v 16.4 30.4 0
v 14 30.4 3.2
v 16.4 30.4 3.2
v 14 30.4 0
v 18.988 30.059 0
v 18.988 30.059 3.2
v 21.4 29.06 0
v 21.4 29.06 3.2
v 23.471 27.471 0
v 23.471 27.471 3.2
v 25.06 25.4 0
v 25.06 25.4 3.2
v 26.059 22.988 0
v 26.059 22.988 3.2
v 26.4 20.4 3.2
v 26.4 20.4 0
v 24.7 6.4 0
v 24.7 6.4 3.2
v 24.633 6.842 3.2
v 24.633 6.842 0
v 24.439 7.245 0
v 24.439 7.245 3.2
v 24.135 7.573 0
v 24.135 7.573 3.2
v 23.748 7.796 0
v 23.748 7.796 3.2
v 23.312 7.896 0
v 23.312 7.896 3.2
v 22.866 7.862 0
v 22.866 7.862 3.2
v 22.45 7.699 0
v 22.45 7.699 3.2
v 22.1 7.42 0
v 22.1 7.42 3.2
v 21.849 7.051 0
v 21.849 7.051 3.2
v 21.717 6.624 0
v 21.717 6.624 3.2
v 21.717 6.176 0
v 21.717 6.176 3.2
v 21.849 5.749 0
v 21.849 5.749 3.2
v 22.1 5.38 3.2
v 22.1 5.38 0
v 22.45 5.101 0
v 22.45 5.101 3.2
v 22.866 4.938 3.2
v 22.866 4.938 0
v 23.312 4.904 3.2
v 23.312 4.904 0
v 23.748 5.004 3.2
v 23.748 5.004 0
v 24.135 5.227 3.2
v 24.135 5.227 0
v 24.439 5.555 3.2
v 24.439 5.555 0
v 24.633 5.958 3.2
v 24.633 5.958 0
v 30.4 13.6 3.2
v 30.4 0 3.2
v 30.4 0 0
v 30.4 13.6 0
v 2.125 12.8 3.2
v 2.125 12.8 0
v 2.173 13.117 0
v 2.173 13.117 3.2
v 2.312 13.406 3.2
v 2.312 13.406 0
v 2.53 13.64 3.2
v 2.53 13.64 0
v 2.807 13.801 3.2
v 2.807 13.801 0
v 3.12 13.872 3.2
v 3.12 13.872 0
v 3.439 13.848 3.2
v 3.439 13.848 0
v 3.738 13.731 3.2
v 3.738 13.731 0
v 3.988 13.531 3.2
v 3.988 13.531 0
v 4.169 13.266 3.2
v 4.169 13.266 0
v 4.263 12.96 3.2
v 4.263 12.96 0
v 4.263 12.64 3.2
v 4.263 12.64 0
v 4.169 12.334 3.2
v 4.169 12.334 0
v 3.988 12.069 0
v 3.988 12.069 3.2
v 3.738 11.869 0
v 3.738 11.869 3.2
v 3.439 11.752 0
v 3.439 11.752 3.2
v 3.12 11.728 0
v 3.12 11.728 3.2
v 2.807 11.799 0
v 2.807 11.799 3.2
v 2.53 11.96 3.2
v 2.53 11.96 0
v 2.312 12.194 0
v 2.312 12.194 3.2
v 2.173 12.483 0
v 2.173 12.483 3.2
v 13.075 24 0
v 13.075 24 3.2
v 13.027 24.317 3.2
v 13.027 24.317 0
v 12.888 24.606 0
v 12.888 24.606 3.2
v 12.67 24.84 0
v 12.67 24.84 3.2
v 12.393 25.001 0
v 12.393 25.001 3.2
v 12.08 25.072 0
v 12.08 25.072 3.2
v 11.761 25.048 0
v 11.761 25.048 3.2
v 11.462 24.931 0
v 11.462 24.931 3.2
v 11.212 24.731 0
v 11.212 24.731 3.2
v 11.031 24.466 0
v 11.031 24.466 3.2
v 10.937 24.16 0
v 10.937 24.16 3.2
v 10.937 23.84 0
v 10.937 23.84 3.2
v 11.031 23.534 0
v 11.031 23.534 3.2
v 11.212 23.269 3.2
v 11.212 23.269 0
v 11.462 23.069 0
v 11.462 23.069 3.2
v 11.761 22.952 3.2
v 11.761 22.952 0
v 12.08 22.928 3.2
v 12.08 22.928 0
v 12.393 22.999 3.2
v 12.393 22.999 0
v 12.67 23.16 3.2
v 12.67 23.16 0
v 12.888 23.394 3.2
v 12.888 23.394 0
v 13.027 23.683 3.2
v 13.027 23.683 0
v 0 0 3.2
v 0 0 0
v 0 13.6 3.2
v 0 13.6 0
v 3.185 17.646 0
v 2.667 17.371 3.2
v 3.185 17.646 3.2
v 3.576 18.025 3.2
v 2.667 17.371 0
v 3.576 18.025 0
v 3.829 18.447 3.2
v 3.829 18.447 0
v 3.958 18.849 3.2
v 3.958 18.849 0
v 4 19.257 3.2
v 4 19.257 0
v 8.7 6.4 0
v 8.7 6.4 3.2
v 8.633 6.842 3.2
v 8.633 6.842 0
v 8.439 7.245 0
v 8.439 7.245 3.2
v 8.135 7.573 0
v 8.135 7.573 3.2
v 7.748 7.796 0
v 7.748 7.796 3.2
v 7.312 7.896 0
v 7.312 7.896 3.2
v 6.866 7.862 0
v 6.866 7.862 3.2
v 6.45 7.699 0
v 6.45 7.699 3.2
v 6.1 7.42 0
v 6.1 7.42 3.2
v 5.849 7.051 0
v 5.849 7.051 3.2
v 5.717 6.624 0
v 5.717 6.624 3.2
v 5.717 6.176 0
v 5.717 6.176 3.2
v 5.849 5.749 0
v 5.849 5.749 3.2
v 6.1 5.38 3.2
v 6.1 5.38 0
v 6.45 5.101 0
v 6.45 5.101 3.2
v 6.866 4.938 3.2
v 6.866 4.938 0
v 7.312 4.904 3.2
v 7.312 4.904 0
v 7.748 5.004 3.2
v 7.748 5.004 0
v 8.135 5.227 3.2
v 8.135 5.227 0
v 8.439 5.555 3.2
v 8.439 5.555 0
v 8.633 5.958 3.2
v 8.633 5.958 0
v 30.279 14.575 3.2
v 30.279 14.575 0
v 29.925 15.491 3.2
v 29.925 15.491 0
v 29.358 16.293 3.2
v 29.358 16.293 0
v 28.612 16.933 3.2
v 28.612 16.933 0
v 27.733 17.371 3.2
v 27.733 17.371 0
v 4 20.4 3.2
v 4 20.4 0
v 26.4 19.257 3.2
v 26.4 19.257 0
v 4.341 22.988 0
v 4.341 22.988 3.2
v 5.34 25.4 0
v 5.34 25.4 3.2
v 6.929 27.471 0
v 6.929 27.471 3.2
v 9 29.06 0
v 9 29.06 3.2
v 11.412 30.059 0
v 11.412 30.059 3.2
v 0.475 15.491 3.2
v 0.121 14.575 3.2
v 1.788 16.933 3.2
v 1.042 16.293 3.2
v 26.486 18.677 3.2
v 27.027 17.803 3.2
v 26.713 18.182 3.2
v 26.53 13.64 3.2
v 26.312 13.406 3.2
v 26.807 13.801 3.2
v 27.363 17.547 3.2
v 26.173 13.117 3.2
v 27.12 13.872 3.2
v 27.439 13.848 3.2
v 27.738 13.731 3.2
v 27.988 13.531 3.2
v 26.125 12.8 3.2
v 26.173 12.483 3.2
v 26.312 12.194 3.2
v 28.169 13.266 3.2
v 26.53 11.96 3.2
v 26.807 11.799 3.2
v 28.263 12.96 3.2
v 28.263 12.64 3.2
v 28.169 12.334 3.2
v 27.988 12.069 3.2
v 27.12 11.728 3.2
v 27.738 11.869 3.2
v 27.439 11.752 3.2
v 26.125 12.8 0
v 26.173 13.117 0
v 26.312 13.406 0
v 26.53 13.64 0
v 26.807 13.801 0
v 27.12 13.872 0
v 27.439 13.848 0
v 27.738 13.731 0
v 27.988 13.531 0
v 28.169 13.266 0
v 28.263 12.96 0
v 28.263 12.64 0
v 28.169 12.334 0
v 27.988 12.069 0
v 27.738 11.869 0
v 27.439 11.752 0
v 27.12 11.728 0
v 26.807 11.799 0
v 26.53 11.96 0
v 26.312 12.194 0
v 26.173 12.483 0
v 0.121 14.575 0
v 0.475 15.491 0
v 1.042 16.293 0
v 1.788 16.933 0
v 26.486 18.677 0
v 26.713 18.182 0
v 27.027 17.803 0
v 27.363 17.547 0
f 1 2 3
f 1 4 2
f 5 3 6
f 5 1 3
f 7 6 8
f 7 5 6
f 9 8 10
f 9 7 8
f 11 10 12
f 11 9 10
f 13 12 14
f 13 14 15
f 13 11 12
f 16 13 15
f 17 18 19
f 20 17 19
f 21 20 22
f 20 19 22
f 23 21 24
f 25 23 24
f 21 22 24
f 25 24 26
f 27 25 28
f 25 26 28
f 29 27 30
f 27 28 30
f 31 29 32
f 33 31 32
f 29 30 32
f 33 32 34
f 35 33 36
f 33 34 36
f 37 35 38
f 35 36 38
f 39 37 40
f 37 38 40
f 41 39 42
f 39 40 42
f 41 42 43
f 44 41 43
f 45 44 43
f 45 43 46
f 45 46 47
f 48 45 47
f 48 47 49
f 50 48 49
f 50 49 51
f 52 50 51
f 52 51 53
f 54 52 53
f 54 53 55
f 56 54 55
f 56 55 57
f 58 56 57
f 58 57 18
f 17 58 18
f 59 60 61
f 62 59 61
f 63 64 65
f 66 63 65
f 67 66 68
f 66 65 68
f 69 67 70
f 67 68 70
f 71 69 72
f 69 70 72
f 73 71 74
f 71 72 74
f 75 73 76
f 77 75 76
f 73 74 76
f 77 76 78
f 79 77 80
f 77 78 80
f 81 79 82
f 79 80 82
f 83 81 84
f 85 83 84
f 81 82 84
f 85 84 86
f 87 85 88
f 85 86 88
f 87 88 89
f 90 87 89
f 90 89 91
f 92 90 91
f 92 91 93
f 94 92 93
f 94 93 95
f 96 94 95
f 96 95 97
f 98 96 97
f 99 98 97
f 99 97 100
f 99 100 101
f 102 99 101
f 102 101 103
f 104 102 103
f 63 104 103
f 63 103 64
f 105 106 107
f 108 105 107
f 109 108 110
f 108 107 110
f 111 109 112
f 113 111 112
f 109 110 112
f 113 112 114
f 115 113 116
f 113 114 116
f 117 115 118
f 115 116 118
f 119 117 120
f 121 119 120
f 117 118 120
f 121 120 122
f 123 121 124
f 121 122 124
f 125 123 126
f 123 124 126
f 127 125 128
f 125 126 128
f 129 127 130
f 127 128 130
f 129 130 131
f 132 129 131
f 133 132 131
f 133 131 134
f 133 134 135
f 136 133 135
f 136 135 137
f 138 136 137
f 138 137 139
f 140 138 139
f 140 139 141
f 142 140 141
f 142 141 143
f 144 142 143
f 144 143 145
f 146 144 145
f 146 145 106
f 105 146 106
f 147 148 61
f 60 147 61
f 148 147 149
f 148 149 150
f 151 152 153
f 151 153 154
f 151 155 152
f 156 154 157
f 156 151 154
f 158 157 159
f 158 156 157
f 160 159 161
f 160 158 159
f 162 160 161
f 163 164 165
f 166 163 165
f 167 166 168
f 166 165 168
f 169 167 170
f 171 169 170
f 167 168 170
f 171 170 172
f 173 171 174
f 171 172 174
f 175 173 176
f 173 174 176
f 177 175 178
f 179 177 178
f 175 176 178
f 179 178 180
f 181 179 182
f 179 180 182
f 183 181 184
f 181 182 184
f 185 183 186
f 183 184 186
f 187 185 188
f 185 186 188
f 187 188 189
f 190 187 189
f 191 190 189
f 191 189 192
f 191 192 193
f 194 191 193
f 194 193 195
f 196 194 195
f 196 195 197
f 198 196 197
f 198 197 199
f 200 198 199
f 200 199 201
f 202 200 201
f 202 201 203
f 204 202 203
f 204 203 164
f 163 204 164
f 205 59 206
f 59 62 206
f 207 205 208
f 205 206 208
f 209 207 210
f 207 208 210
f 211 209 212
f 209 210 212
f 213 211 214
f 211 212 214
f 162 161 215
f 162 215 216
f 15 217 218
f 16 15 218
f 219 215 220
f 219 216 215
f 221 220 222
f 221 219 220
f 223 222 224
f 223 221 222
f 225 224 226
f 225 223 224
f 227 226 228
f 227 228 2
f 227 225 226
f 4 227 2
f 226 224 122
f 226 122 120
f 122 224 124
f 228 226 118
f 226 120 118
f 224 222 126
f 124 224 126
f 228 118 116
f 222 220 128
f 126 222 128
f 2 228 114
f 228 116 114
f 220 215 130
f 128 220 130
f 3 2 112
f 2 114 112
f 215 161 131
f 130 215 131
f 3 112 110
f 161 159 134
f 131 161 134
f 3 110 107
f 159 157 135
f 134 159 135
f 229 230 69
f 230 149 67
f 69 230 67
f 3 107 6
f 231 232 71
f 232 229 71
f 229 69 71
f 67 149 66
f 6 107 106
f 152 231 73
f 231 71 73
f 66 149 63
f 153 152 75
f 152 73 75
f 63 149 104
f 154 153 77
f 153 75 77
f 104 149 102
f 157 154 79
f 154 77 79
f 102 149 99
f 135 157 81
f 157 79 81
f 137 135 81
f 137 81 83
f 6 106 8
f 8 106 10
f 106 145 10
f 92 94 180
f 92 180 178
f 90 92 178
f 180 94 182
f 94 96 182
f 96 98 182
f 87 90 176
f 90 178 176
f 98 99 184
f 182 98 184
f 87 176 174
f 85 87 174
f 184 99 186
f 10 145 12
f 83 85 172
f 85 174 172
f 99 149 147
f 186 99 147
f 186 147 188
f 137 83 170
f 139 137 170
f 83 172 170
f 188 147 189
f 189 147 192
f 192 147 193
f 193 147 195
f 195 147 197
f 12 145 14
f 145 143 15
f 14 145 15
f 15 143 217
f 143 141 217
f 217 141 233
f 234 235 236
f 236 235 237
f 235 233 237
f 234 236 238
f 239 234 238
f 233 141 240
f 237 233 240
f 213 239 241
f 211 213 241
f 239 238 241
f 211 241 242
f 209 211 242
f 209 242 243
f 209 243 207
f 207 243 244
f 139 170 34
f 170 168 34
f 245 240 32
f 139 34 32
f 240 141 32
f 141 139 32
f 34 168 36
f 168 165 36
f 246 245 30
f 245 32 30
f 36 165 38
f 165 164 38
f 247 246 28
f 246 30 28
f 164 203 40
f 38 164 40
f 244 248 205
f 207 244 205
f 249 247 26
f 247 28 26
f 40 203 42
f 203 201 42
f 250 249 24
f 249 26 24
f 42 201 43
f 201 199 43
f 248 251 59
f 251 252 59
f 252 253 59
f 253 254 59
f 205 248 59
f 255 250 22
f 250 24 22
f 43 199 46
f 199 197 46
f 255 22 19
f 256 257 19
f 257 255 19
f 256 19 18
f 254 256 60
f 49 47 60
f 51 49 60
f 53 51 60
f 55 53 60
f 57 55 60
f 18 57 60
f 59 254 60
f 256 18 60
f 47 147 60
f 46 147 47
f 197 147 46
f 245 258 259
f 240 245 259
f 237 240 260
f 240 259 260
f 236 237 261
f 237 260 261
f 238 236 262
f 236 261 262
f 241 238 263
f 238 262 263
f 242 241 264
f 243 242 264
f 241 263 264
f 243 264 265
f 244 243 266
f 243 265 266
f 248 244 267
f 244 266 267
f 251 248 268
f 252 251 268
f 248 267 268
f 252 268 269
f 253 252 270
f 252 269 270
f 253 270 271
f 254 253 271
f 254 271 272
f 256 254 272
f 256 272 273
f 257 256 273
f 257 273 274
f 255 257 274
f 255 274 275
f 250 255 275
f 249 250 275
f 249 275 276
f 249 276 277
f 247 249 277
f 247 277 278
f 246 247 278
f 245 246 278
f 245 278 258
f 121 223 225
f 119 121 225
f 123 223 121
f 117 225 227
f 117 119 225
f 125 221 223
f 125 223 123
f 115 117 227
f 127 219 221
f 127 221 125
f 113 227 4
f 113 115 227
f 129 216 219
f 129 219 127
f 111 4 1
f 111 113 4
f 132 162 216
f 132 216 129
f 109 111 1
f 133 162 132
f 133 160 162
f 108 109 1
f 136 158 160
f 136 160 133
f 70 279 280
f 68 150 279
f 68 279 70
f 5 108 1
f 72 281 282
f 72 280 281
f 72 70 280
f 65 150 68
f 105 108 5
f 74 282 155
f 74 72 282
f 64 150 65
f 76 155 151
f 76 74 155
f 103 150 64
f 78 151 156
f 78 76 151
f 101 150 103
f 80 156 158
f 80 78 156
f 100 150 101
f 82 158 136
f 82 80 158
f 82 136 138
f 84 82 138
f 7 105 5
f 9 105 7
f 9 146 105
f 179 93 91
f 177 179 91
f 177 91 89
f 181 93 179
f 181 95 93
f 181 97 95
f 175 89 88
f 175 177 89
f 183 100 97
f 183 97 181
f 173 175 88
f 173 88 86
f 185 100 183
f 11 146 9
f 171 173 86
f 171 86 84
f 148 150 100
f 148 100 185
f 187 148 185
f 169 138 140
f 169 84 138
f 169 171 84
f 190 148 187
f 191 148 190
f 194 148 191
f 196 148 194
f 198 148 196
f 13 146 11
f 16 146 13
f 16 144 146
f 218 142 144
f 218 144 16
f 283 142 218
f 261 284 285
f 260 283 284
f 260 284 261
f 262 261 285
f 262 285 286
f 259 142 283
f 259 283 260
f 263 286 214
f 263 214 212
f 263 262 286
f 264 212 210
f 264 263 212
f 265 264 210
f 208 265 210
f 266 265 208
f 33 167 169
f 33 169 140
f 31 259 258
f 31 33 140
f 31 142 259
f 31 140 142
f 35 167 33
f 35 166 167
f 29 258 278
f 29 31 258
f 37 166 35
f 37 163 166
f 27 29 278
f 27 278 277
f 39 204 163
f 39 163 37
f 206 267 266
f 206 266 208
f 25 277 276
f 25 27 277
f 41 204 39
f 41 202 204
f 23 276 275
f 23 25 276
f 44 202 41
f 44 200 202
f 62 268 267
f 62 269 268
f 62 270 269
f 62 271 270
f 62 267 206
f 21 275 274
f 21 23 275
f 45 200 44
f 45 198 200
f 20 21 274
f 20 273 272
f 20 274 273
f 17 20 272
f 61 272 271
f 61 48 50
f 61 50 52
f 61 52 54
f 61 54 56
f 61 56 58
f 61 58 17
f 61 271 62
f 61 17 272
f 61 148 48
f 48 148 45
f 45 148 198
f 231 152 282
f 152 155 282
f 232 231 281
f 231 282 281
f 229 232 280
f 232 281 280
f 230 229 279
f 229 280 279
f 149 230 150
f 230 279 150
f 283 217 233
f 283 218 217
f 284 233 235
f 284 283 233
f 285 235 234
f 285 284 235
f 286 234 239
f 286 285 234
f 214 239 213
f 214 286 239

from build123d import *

# Parameters (mm, degrees)
SKETCH1_W           = 30.4
SKETCH1_H           = 3.2
BOSS_EXTRUDE1_DEPTH = 17.6
SKETCH2_R           = 1.5
CUT_EXTRUDE1_DEPTH  = 16
SKETCH3_R           = 1.075
CUT_EXTRUDE2_DEPTH  = 16
SKETCH4_W           = 22.4
SKETCH4_H           = 3.2
BOSS_EXTRUDE2_DEPTH = 12.8
SKETCH5_R           = 1.075
CUT_EXTRUDE3_DEPTH  = 16
FILLET1_R           = 10
FILLET2_R           = 4
FILLET3_R           = 2


with BuildPart() as part:
    # Sketch1 → Boss-Extrude1 (new body)
    with BuildSketch(Plane(origin=(0, 0, 0), x_dir=(1, 0, 0), z_dir=(0, 1, 0))):
        with Locations((15.2, -1.6)):
            Rectangle(SKETCH1_W, SKETCH1_H)
    extrude(amount=BOSS_EXTRUDE1_DEPTH)

    # Sketch2 → Cut-Extrude1 (cut)
    with BuildSketch(Plane.XY.offset(3.2)):
        with Locations((23.2, 6.4)):
            Circle(SKETCH2_R)
        with Locations((7.2, 6.4)):
            Circle(SKETCH2_R)
    extrude(amount=-CUT_EXTRUDE1_DEPTH, mode=Mode.SUBTRACT)

    # Sketch3 → Cut-Extrude2 (cut)
    with BuildSketch(Plane(origin=(0, 0, 0), x_dir=(-1, 0, 0), z_dir=(0, 0, -1))):
        with Locations((-27.2, 12.8)):
            Circle(SKETCH3_R)
        with Locations((-3.2, 12.8)):
            Circle(SKETCH3_R)
    extrude(amount=-CUT_EXTRUDE2_DEPTH, mode=Mode.SUBTRACT)

    # Sketch4 → Boss-Extrude2 (add)
    with BuildSketch(Plane(origin=(0, 17.6, 0), x_dir=(1, 0, 0), z_dir=(0, 1, 0))):
        with Locations((15.2, -1.6)):
            Rectangle(SKETCH4_W, SKETCH4_H)
    extrude(amount=BOSS_EXTRUDE2_DEPTH)

    # Sketch5 → Cut-Extrude3 (cut)
    with BuildSketch(Plane.XY.offset(3.2)):
        with Locations((12, 24)):
            Circle(SKETCH5_R)
    extrude(amount=-CUT_EXTRUDE3_DEPTH, mode=Mode.SUBTRACT)

    # Fillet1
    fillet1_edges = [part.edges().sort_by_distance(p)[0] for p in [
        (4, 30.4, 1.6),
        (26.4, 30.4, 1.6),
    ]]
    fillet(fillet1_edges, radius=FILLET1_R)

    # Fillet2
    fillet2_edges = [part.edges().sort_by_distance(p)[0] for p in [
        (30.4, 17.6, 1.6),
        (0, 17.6, 1.6),
    ]]
    fillet(fillet2_edges, radius=FILLET2_R - 0.0001)  # a hair under: the kernel refuses the full size

    # Fillet3
    fillet3_edges = [part.edges().sort_by_distance(p)[0] for p in [
        (4, 17.6, 1.6),
        (26.4, 17.6, 1.6),
    ]]
    fillet(fillet3_edges, radius=FILLET3_R)


solid = part.part
